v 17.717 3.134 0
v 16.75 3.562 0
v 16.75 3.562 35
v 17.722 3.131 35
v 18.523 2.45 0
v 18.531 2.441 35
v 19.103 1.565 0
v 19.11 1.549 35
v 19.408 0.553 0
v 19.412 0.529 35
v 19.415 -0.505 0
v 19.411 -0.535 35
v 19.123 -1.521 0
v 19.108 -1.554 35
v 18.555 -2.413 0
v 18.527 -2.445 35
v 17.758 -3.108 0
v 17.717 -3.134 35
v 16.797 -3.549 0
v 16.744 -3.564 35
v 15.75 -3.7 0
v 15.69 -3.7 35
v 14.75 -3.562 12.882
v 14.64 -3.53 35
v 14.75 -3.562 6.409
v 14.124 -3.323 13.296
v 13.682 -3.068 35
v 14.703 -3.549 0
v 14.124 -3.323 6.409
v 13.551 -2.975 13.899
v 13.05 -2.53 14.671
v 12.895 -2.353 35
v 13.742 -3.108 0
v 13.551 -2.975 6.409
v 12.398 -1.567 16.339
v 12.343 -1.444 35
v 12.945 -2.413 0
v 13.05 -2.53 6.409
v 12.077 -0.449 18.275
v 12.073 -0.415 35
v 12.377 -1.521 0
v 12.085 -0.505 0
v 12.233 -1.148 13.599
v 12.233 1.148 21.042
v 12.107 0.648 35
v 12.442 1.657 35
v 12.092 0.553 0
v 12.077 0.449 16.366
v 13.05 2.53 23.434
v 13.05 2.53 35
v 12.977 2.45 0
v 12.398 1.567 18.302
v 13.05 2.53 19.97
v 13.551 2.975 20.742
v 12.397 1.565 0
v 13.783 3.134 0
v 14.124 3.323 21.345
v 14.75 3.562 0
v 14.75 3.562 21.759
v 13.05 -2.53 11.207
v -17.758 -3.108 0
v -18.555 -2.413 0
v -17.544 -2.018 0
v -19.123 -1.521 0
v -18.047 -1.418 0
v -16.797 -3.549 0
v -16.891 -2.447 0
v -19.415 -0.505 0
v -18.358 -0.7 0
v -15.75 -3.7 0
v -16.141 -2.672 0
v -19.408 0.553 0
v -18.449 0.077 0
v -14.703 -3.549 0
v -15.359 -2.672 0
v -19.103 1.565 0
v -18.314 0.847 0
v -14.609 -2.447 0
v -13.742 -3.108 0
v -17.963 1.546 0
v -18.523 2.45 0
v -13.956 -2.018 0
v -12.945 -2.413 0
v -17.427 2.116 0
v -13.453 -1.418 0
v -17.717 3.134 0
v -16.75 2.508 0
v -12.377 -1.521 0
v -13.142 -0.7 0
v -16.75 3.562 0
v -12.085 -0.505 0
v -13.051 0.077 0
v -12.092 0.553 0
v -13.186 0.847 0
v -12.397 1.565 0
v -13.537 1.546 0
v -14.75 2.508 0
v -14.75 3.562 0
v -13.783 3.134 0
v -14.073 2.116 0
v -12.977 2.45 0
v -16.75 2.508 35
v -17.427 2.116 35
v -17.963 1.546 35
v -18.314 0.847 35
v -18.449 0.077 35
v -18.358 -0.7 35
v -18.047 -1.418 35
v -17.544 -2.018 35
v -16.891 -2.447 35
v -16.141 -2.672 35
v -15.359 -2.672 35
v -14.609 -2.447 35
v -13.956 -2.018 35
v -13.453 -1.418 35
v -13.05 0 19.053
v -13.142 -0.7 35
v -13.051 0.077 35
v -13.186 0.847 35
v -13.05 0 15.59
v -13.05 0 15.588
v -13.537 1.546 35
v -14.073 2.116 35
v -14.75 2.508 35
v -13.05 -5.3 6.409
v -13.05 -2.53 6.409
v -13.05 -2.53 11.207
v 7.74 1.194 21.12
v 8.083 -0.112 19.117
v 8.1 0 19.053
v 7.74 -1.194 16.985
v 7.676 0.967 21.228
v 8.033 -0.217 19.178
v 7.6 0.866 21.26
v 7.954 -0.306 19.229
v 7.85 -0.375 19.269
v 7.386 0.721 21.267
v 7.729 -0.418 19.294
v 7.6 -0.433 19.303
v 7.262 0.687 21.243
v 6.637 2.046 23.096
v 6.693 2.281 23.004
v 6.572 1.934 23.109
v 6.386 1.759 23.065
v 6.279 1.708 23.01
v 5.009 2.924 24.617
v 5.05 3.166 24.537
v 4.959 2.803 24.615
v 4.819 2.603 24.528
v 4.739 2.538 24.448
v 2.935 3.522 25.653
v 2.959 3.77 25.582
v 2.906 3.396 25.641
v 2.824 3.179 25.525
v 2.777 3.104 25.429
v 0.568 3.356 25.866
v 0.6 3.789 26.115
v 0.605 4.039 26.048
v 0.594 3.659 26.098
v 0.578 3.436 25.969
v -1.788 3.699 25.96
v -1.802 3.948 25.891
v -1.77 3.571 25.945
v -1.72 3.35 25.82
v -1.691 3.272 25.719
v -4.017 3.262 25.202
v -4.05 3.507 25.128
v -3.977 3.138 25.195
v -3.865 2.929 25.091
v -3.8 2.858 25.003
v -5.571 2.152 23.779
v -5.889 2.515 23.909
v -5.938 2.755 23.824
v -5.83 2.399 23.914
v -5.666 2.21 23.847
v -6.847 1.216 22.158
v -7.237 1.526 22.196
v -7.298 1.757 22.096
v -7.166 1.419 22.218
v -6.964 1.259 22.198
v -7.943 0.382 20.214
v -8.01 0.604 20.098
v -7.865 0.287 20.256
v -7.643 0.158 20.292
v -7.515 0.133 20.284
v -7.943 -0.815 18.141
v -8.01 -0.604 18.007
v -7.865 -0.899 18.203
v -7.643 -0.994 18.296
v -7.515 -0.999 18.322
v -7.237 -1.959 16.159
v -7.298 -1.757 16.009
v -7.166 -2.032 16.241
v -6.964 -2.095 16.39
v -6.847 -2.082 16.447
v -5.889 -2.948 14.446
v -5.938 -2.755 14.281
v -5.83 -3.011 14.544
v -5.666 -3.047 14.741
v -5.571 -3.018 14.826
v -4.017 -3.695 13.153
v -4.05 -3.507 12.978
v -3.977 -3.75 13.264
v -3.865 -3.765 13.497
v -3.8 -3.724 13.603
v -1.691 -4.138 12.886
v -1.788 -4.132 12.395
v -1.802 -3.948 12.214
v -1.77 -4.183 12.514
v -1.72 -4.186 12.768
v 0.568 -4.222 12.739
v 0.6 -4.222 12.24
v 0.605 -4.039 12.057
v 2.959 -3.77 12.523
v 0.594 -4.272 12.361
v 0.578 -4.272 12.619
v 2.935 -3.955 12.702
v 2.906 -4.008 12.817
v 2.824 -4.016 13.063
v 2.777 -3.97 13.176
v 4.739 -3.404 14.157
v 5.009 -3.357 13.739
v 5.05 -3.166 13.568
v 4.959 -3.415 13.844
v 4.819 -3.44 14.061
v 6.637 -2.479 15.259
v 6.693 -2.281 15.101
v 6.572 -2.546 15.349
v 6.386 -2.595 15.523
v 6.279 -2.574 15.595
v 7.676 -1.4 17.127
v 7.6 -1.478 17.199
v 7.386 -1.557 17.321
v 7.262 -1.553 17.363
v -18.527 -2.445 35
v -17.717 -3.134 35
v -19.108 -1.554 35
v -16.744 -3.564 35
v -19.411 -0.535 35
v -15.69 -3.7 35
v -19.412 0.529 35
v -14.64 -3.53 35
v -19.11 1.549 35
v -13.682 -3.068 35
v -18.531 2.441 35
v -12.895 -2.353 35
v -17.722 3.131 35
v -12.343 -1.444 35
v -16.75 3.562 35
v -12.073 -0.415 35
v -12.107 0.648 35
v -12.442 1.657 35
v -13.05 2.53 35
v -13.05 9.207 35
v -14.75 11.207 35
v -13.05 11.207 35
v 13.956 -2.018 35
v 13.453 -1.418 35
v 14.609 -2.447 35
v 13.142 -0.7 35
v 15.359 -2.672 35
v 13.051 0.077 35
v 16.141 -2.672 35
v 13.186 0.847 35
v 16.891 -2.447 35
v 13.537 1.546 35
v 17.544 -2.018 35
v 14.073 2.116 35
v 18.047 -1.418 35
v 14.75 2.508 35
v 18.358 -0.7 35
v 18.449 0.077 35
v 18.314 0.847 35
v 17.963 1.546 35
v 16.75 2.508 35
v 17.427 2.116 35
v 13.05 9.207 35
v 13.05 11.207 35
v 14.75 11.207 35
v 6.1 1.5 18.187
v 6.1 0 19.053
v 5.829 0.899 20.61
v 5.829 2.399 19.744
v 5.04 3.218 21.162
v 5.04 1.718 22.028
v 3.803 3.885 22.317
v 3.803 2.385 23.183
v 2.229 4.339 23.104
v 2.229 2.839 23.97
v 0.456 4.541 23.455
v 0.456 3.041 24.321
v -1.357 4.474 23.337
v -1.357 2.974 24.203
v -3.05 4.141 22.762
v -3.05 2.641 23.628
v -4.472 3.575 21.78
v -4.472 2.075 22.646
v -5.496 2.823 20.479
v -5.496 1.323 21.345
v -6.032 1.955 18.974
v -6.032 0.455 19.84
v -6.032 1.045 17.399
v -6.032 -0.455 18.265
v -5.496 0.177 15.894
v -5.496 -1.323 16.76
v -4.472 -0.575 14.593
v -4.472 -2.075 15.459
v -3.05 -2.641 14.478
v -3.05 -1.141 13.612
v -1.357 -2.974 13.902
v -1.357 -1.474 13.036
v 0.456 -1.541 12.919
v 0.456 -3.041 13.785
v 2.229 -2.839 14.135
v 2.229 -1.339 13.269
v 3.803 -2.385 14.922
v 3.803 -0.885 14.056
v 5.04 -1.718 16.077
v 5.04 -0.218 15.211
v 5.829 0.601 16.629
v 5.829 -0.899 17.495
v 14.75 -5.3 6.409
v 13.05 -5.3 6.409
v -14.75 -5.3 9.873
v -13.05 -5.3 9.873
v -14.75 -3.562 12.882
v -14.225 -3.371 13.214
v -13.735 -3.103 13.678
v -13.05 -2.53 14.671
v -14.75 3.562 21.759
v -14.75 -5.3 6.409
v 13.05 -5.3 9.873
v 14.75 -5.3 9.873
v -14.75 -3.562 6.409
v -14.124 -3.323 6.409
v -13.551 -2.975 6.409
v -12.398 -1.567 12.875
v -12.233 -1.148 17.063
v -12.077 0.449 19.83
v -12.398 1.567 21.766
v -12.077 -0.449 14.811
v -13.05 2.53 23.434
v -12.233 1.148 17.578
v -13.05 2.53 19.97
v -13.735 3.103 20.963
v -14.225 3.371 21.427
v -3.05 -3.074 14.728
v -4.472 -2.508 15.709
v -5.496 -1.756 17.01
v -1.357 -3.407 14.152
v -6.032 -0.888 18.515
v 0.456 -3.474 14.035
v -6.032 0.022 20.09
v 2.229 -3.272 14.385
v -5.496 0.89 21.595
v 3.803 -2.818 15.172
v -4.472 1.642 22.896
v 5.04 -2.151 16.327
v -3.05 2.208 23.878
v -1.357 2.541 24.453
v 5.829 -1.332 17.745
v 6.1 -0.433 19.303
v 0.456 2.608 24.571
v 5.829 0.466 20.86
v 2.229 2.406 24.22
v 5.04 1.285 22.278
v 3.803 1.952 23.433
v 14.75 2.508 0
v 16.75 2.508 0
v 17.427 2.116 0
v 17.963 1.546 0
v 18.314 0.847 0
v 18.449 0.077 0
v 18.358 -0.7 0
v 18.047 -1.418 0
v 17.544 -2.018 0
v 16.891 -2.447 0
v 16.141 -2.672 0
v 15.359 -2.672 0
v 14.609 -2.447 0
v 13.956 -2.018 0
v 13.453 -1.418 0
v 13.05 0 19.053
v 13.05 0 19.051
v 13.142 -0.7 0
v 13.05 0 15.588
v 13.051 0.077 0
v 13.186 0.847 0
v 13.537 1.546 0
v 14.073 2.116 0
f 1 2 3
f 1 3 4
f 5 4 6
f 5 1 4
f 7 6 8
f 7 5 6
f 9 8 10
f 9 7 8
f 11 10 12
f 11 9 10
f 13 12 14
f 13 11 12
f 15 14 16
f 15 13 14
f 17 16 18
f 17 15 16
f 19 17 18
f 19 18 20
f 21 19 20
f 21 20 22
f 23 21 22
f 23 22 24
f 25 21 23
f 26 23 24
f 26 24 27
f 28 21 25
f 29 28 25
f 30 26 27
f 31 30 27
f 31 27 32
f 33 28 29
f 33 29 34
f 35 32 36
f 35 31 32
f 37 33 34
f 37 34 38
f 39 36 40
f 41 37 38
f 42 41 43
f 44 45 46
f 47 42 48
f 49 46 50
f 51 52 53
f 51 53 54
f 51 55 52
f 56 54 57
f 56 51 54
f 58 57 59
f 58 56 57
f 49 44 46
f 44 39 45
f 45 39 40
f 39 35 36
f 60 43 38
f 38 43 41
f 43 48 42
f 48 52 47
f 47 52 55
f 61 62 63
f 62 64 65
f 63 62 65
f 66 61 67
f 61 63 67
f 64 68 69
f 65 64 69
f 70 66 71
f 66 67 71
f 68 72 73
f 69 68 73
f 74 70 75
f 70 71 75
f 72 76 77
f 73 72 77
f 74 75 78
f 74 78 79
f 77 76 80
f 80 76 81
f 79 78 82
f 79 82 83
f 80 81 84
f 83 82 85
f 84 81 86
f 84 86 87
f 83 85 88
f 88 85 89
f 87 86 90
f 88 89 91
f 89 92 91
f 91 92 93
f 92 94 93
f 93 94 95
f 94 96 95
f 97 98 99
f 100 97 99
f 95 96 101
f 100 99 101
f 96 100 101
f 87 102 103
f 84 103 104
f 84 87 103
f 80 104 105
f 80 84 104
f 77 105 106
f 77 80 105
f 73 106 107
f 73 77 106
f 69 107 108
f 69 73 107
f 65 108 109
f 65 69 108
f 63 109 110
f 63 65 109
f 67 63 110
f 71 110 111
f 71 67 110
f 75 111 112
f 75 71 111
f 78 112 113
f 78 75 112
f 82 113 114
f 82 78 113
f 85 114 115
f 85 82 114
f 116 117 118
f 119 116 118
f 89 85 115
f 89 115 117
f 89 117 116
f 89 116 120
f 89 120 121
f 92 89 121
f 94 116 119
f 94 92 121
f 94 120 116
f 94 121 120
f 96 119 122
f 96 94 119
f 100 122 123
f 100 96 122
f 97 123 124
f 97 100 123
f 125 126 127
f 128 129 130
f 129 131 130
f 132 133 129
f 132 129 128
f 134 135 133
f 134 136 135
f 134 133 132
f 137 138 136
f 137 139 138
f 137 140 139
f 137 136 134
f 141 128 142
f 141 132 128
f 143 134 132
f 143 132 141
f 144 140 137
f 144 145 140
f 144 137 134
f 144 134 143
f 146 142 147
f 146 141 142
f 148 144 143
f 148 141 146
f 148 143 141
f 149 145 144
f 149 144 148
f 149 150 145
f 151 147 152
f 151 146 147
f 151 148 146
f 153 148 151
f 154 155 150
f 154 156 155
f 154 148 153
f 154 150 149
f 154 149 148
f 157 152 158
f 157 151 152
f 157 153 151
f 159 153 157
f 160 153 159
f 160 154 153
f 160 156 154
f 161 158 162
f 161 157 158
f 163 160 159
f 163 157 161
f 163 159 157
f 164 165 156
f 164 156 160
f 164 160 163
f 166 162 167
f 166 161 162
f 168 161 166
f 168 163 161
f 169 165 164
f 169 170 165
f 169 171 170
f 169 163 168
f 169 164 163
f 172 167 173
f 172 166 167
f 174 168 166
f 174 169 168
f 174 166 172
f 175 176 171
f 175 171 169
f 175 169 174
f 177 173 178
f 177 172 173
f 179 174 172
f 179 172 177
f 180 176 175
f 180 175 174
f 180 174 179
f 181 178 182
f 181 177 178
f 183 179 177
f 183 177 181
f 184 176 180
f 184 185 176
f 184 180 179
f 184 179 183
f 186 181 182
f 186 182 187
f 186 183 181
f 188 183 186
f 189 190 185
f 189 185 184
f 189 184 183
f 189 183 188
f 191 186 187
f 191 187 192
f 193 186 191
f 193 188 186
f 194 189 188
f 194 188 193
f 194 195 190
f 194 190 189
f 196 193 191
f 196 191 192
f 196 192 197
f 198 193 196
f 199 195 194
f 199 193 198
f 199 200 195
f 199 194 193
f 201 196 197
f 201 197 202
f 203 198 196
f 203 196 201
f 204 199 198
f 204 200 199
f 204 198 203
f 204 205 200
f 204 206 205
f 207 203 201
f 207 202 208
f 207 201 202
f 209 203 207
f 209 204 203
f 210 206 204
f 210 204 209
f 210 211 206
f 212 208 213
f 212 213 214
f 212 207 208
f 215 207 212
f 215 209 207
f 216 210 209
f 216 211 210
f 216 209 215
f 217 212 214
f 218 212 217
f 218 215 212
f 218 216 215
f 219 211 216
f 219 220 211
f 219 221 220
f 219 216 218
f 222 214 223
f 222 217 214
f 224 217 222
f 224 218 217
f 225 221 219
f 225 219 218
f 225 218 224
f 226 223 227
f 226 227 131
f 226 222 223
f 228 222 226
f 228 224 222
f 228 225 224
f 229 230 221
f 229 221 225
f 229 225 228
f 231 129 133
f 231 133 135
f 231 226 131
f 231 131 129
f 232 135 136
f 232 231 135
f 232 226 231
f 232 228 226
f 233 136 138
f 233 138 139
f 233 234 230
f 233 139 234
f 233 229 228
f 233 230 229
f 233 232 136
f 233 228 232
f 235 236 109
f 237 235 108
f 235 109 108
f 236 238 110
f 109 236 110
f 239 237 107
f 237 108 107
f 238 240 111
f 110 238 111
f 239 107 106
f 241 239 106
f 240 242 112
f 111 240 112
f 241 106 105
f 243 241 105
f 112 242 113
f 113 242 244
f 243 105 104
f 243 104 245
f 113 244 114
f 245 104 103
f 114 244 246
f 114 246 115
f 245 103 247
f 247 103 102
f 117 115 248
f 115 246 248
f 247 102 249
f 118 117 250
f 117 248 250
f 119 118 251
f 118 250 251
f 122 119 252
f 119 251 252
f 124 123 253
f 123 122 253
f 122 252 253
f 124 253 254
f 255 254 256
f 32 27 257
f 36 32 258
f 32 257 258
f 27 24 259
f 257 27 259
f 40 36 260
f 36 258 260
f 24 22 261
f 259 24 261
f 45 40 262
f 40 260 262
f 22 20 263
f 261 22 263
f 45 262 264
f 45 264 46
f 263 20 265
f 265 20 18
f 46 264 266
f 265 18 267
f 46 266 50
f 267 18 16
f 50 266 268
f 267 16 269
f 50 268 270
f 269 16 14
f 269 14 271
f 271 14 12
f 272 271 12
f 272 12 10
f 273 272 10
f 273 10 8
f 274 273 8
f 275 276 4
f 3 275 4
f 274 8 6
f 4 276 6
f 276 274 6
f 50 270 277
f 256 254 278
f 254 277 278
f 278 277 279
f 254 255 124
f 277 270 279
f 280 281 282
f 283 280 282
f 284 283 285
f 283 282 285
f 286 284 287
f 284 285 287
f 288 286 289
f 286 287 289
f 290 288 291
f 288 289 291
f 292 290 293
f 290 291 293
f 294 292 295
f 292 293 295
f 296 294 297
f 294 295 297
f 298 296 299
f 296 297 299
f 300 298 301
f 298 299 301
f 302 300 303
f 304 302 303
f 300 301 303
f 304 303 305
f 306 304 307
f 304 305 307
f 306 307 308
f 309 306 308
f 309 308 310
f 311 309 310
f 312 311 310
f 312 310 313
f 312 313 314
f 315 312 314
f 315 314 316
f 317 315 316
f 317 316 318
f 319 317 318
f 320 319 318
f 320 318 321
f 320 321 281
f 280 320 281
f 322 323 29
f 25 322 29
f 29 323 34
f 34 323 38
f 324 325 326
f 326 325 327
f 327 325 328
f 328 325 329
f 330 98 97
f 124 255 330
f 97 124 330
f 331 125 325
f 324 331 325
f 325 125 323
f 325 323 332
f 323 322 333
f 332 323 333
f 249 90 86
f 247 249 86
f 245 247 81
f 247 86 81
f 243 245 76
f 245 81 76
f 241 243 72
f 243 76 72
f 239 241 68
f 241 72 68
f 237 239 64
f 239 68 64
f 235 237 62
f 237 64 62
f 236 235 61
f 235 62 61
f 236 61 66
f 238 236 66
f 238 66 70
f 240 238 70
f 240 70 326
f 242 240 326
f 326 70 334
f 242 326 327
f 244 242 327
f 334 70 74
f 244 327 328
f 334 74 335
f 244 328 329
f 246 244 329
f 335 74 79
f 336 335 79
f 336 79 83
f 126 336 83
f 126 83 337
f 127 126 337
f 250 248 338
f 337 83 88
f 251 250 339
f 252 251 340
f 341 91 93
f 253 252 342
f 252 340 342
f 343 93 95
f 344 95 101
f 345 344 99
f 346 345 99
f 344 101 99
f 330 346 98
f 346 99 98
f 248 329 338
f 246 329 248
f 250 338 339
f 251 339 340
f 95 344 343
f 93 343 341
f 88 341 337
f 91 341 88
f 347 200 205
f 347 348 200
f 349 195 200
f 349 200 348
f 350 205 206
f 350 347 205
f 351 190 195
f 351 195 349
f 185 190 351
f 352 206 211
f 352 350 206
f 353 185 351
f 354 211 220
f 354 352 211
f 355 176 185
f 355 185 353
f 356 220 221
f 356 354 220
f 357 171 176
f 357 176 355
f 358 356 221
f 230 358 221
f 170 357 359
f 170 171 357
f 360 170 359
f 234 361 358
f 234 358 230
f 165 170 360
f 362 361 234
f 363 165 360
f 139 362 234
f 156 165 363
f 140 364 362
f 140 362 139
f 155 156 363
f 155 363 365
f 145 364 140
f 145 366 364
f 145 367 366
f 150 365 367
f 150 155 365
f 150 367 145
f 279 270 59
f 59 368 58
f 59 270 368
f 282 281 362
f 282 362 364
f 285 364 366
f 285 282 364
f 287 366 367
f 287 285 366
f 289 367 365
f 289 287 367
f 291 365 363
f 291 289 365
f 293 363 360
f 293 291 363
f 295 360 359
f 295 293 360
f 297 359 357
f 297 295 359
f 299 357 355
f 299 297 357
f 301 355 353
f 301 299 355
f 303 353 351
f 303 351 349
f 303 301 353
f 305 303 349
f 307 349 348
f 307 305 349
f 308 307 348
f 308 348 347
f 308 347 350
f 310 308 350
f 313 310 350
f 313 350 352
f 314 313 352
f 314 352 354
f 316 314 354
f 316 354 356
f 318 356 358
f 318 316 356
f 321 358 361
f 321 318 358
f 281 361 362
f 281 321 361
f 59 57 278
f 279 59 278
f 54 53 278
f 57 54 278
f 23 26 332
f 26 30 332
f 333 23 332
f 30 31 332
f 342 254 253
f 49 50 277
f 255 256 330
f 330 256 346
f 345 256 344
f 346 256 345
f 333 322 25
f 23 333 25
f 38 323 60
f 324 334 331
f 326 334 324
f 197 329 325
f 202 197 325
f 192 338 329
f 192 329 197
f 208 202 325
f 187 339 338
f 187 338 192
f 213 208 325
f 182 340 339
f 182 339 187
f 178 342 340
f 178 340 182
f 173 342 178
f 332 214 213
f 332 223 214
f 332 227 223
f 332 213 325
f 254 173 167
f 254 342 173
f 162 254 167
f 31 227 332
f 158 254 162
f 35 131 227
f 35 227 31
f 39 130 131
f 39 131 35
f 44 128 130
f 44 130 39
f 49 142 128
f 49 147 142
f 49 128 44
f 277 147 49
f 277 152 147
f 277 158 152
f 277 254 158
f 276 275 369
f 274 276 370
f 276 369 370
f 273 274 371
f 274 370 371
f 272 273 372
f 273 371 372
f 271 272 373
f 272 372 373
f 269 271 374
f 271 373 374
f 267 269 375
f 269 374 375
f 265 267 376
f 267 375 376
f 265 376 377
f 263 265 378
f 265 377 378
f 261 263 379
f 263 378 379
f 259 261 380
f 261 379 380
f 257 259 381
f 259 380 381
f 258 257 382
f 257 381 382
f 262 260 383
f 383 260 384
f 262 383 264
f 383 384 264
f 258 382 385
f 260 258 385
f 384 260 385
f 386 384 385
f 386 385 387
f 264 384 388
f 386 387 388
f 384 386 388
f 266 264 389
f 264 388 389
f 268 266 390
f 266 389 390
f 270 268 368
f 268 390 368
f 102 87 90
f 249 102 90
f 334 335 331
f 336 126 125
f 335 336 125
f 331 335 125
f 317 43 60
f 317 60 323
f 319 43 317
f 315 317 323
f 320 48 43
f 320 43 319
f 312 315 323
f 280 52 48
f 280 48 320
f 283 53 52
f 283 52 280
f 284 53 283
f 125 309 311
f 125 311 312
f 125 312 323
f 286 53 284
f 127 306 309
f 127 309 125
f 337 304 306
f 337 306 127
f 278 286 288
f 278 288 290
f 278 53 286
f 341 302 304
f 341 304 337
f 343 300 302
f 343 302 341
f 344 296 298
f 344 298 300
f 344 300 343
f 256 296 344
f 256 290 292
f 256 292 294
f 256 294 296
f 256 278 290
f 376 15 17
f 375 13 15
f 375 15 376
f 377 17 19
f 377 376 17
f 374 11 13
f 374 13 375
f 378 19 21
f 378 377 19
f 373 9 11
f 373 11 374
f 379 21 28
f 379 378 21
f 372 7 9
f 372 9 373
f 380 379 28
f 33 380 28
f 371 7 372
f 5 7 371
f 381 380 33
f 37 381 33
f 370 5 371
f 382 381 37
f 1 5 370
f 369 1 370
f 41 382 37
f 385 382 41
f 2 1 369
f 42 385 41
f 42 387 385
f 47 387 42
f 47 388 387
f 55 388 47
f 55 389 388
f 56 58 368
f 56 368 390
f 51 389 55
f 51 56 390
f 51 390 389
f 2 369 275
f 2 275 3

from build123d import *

# Parameters (mm, degrees)
F0_R      = 3.7
F0_R_2    = 2.7
F1_DEPTH  = 35
F2_W      = 2
F2_H      = 6.1218521535
F3_DEPTH  = 35.001
F6_W      = 26.1
F6_H      = 2
F8_W      = 26.1
F8_H      = 2
F11_DEPTH = 1.7
F13_DEPTH = 1.7
F14_R     = 6.1
F15_DEPTH = 19.2330509442
F14_R_2   = 8.1
F16_DEPTH = 0.5
F17_R     = 0.49999
F19_DEPTH = 26.1
F21_DEPTH = 1.7
F23_DEPTH = 1.7


# Not quite as in the source:
# - a fillet or chamfer is up to 0.001 mm smaller than in the source, because OpenCascade refuses the exact size


with BuildPart() as f1:
    # F0 (on Top) → F1 (new body)
    with BuildSketch(Plane.XY):
        with Locations((-15.75, 0)):
            Circle(F0_R)
        with Locations((-15.75, 0)):
            Circle(F0_R_2, mode=Mode.SUBTRACT)
    extrude(amount=F1_DEPTH)

    # F2 (on Top) → F3 (cut, through all)
    with BuildSketch(Plane.XY):
        with Locations((-15.75, 2.7)):
            Rectangle(F2_W, F2_H)
    extrude(amount=F3_DEPTH, mode=Mode.SUBTRACT)


with BuildPart() as f5_1:
    # F5: instance of F1
    add(f1.part.mirror(Plane.YZ))


with BuildPart() as f1_1:
    add(f1.part)

    add(f5_1.part)  # F9 merges F5_1
    # F6 (on Top) → F9 section 0
    with BuildSketch(Plane.XY):
        with Locations((0, -10)):
            Rectangle(F6_W, F6_H)
    # F8 (on offset) → F9 section 1
    with BuildSketch(Plane.XY.offset(35)):
        with Locations((0, 10.2072594216)):
            Rectangle(F8_W, F8_H)
    loft()

    # F10 (on face) → F11 (join, through all)
    with BuildSketch(Plane.YZ.offset(13.05)):
        Polygon((2.5079872408, 19.9324185939), (2.5298221281, 19.9702377282), (11.2072594216, 35), (2.5079872408, 35), align=None)
    extrude(amount=F11_DEPTH)

    # F12 (on face) → F13 (join, through all)
    with BuildSketch(Plane(origin=(-13.05, 0, 0), x_dir=(0, -1, 0), z_dir=(-1, 0, 0))):
        Polygon((-11.2072594216, 35), (-2.5298221281, 19.9702377282), (-2.5079872408, 19.9324185939), (-2.5079872408, 35), align=None)
    extrude(amount=F13_DEPTH)

    # F14 (on face) → F15 (cut, through all)
    with BuildSketch(Plane(origin=(0, -8.25, 4.7631397208), x_dir=(1, 0, 0), z_dir=(0, -0.8660254038, 0.5))):
        with Locations((0, 16.5)):
            Circle(F14_R)
    extrude(amount=-F15_DEPTH, mode=Mode.SUBTRACT)

    # F14 (on face) → F16 (join)
    with BuildSketch(Plane(origin=(0, -8.25, 4.7631397208), x_dir=(1, 0, 0), z_dir=(0, -0.8660254038, 0.5))):
        with Locations((0, 16.5)):
            Circle(F14_R_2)
        with Locations((0, 16.5)):
            Circle(F14_R, mode=Mode.SUBTRACT)
    extrude(amount=F16_DEPTH)

    # F17 (radius 0.5 in the source; OpenCascade refuses exactly that, so slightly less here)
    f17_edges = [f1_1.edges().sort_by_distance(p)[0] for p in [
        (-8.1, -0.433013, 19.302559),
    ]]
    fillet(f17_edges, radius=F17_R)

    # F18 (on face) → F19 (cut, through all)
    with BuildSketch(Plane.YZ.offset(13.05)):
        Polygon((-5.3, 9.8726896031), (-11, 0), (-9, 0), (-5.3, 6.408587988), align=None)
    extrude(amount=-F19_DEPTH, mode=Mode.SUBTRACT)

    # F20 (on face) → F21 (join, through all)
    with BuildSketch(Plane.YZ.offset(13.05)):
        Polygon((-2.5298221281, 14.6707784232), (-5.3, 9.8726896031), (-5.3, 6.408587988), (-2.5298221281, 6.408587988), align=None)
    extrude(amount=F21_DEPTH)

    # F22 (on face) → F23 (join, through all)
    with BuildSketch(Plane(origin=(-13.05, 0, 0), x_dir=(0, -1, 0), z_dir=(-1, 0, 0))):
        Polygon((5.3, 6.408587988), (5.3, 9.8726896031), (2.5298221281, 14.6707784232), (2.5298221281, 6.408587988), align=None)
    extrude(amount=F23_DEPTH)


solid = f1_1.part
